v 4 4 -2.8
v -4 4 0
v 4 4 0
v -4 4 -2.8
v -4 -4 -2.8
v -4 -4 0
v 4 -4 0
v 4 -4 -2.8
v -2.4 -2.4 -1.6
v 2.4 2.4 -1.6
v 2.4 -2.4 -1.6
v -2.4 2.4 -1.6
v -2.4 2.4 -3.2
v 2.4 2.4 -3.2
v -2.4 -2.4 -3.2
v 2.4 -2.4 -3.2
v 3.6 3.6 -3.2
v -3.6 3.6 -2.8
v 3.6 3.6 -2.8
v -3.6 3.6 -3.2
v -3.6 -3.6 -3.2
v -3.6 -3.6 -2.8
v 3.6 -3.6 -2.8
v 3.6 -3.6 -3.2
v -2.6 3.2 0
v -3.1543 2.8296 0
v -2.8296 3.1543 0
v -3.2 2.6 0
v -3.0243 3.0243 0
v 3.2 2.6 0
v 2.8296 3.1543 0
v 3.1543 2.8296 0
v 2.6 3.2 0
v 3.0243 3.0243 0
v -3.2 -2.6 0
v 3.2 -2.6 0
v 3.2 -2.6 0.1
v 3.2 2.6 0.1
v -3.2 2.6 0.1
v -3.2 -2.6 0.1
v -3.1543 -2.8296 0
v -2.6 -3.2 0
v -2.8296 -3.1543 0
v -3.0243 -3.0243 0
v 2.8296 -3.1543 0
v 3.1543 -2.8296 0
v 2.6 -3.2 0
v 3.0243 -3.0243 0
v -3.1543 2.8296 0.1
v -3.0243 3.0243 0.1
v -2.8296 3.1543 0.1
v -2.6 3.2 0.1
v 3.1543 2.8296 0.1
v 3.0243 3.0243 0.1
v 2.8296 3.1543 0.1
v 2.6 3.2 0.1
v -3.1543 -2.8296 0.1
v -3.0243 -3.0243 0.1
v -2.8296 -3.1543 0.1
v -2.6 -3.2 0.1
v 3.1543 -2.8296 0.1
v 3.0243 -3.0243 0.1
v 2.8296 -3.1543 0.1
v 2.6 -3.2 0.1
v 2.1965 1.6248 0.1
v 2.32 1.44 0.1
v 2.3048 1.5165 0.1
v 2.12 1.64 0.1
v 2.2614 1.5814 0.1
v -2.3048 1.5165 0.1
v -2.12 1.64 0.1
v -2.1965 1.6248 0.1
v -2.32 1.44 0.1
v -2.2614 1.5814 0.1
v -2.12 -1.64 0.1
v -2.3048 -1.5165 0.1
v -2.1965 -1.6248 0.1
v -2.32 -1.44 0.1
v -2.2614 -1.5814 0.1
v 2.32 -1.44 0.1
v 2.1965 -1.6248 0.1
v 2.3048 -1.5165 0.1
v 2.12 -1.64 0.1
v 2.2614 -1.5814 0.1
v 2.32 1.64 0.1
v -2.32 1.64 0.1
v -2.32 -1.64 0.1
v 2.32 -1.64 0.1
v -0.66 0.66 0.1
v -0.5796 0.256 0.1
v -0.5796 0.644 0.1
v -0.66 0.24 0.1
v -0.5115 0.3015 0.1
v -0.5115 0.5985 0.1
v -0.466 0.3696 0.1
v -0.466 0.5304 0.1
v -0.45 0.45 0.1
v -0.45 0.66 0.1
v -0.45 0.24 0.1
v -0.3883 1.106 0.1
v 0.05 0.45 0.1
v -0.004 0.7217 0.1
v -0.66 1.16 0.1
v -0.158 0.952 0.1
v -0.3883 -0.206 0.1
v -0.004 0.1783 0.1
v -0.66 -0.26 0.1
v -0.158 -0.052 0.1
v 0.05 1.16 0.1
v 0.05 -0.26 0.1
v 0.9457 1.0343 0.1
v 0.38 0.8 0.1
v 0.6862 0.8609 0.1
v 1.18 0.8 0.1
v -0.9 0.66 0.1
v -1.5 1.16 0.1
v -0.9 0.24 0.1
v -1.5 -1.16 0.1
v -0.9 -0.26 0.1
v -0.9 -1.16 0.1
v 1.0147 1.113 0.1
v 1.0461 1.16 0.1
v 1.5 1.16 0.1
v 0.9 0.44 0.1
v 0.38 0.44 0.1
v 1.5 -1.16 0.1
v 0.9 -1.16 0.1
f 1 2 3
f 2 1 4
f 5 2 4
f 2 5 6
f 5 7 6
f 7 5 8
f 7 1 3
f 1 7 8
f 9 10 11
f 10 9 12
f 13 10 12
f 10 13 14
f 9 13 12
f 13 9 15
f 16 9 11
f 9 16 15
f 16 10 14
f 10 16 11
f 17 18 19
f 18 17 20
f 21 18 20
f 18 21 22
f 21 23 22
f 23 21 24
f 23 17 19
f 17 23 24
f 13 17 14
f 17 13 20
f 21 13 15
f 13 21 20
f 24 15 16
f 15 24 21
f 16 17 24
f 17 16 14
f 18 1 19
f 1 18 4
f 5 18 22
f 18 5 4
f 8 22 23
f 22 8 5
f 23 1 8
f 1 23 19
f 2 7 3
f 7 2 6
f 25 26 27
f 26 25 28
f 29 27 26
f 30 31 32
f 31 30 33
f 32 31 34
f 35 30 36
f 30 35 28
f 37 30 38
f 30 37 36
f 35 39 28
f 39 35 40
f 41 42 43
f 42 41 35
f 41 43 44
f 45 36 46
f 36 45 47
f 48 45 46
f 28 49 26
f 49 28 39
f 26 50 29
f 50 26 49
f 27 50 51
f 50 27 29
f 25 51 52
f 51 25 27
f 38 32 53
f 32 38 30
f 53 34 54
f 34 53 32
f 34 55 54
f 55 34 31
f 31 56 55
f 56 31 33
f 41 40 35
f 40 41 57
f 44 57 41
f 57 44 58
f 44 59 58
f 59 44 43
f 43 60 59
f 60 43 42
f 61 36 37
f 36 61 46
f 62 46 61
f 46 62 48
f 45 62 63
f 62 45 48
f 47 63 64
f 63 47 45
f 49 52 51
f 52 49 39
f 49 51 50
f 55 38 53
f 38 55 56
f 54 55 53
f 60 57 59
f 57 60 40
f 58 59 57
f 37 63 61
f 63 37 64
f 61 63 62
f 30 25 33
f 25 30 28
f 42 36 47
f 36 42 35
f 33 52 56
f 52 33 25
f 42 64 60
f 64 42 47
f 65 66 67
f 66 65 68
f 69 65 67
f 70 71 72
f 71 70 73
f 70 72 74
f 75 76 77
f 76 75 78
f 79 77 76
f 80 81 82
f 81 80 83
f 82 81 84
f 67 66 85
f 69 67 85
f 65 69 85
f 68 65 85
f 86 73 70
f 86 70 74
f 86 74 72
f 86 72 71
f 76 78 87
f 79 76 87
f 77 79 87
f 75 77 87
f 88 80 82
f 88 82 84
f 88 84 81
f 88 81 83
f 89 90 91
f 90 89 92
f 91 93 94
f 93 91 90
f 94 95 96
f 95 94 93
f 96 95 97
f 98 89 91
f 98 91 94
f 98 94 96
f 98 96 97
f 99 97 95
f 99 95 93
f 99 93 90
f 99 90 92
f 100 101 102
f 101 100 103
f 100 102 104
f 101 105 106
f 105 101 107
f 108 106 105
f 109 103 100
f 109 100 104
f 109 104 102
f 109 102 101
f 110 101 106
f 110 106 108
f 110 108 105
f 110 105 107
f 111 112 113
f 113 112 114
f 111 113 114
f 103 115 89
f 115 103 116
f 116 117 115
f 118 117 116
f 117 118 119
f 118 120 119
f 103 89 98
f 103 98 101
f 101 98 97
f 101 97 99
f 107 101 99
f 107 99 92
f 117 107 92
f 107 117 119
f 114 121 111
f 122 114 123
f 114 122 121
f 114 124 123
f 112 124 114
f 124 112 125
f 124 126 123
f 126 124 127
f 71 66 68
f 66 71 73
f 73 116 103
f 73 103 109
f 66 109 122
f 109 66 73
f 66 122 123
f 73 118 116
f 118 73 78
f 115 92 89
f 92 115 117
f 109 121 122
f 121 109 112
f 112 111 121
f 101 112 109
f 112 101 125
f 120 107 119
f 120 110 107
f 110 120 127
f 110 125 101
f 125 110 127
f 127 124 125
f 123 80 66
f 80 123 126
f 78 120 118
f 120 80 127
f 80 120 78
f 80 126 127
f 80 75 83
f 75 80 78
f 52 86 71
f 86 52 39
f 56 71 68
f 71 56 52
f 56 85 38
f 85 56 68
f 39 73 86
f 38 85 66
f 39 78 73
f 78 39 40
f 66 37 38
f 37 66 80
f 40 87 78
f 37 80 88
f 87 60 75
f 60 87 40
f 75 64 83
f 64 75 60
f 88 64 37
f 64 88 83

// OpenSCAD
// file: ../p/box5.scad
use <../lib.scad>
function ldraw_lib__box5() = [
// 0 Box with 5 Faces and All Edges
// 0 Name: box5.dat
// 0 Author: James Jessiman
// 0 !LDRAW_ORG Primitive UPDATE 2012-01
// 0 !LICENSE Licensed under CC BY 4.0 : see CAreadme.txt
// 
// 0 BFC CERTIFY CCW
  [0,"BFC","CERTIFY"],
  [0,"BFC","CCW"],
// 
// 0 !HISTORY 2002-04-03 [sbliss] Modified for BFC compliance
// 0 !HISTORY 2002-04-25 [PTadmin] Official Update 2002-02
// 0 !HISTORY 2007-06-24 [PTadmin] Header formatted for Contributor Agreement
// 0 !HISTORY 2008-07-01 [PTadmin] Official Update 2008-01
// 0 !HISTORY 2012-02-16 [Philo] Changed to CCW
// 0 !HISTORY 2012-03-30 [PTadmin] Official Update 2012-01
// 
// 
// 2 24 1 1 1 -1 1 1
  [2,24,1,1,1,-1,1,1],
// 2 24 -1 1 1 -1 1 -1
  [2,24,-1,1,1,-1,1,-1],
// 2 24 -1 1 -1 1 1 -1
  [2,24,-1,1,-1,1,1,-1],
// 2 24 1 1 -1 1 1 1
  [2,24,1,1,-1,1,1,1],
// 2 24 1 0 1 -1 0 1
  [2,24,1,0,1,-1,0,1],
// 2 24 -1 0 1 -1 0 -1
  [2,24,-1,0,1,-1,0,-1],
// 2 24 -1 0 -1 1 0 -1
  [2,24,-1,0,-1,1,0,-1],
// 2 24 1 0 -1 1 0 1
  [2,24,1,0,-1,1,0,1],
// 2 24 1 0 1 1 1 1
  [2,24,1,0,1,1,1,1],
// 2 24 -1 0 1 -1 1 1
  [2,24,-1,0,1,-1,1,1],
// 2 24 1 0 -1 1 1 -1
  [2,24,1,0,-1,1,1,-1],
// 2 24 -1 0 -1 -1 1 -1
  [2,24,-1,0,-1,-1,1,-1],
// 4 16 -1 1 1 1 1 1 1 1 -1 -1 1 -1
  [4,16,-1,1,1,1,1,1,1,1,-1,-1,1,-1],
// 4 16 -1 1 1 -1 0 1 1 0 1 1 1 1
  [4,16,-1,1,1,-1,0,1,1,0,1,1,1,1],
// 4 16 -1 1 -1 -1 0 -1 -1 0 1 -1 1 1
  [4,16,-1,1,-1,-1,0,-1,-1,0,1,-1,1,1],
// 4 16 1 1 -1 1 0 -1 -1 0 -1 -1 1 -1
  [4,16,1,1,-1,1,0,-1,-1,0,-1,-1,1,-1],
// 4 16 1 1 1 1 0 1 1 0 -1 1 1 -1
  [4,16,1,1,1,1,0,1,1,0,-1,1,1,-1],
];
module ldraw_lib__box5(step=0, col=false, unit=2/5, alt=false, line=0.2, solid=!$preview)
    makepoly(ldraw_lib__box5(), step=step, col=col, unit=unit, alt=alt, line=line, solid=solid);
ldraw_lib__box5(line=0.2);
// file: ../p/box4.scad
use <../lib.scad>
function ldraw_lib__box4() = [
// 0 Box with 4 Faces (2 Parallel Pairs) and All Edges
// 0 Name: box4.dat
// 0 Author: James Jessiman
// 0 !LDRAW_ORG Primitive UPDATE 2012-01
// 0 !LICENSE Licensed under CC BY 4.0 : see CAreadme.txt
// 
// 0 BFC CERTIFY CCW
  [0,"BFC","CERTIFY"],
  [0,"BFC","CCW"],
// 
// 0 !HISTORY 2002-04-03 [sbliss] Modified for BFC compliance
// 0 !HISTORY 2002-04-25 [PTadmin] Official Update 2002-02
// 0 !HISTORY 2007-06-24 [PTadmin] Header formatted for Contributor Agreement
// 0 !HISTORY 2008-07-01 [PTadmin] Official Update 2008-01
// 0 !HISTORY 2012-02-16 [Philo] Changed to CCW
// 0 !HISTORY 2012-03-30 [PTadmin] Official Update 2012-01
// 
// 
// 2 24 1 1 1 -1 1 1
  [2,24,1,1,1,-1,1,1],
// 2 24 -1 1 1 -1 1 -1
  [2,24,-1,1,1,-1,1,-1],
// 2 24 -1 1 -1 1 1 -1
  [2,24,-1,1,-1,1,1,-1],
// 2 24 1 1 -1 1 1 1
  [2,24,1,1,-1,1,1,1],
// 2 24 1 0 1 -1 0 1
  [2,24,1,0,1,-1,0,1],
// 2 24 -1 0 1 -1 0 -1
  [2,24,-1,0,1,-1,0,-1],
// 2 24 -1 0 -1 1 0 -1
  [2,24,-1,0,-1,1,0,-1],
// 2 24 1 0 -1 1 0 1
  [2,24,1,0,-1,1,0,1],
// 2 24 1 0 1 1 1 1
  [2,24,1,0,1,1,1,1],
// 2 24 -1 0 1 -1 1 1
  [2,24,-1,0,1,-1,1,1],
// 2 24 1 0 -1 1 1 -1
  [2,24,1,0,-1,1,1,-1],
// 2 24 -1 0 -1 -1 1 -1
  [2,24,-1,0,-1,-1,1,-1],
// 4 16 -1 1 1 -1 0 1 1 0 1 1 1 1
  [4,16,-1,1,1,-1,0,1,1,0,1,1,1,1],
// 4 16 -1 1 -1 -1 0 -1 -1 0 1 -1 1 1
  [4,16,-1,1,-1,-1,0,-1,-1,0,1,-1,1,1],
// 4 16 1 1 -1 1 0 -1 -1 0 -1 -1 1 -1
  [4,16,1,1,-1,1,0,-1,-1,0,-1,-1,1,-1],
// 4 16 1 1 1 1 0 1 1 0 -1 1 1 -1
  [4,16,1,1,1,1,0,1,1,0,-1,1,1,-1],
];
module ldraw_lib__box4(step=0, col=false, unit=2/5, alt=false, line=0.2, solid=!$preview)
    makepoly(ldraw_lib__box4(), step=step, col=col, unit=unit, alt=alt, line=line, solid=solid);
ldraw_lib__box4(line=0.2);
// file: ../p/box3u12.scad
use <../lib.scad>
function ldraw_lib__box3u12() = [
// 0 Box with 3 Parallel Faces without Any Edges
// 0 Name: box3u12.dat
// 0 Author: J.C. Tchang [tchang]
// 0 !LDRAW_ORG Primitive UPDATE 2014-02
// 0 !LICENSE Licensed under CC BY 4.0 : see CAreadme.txt
// 
// 0 BFC CERTIFY CCW
  [0,"BFC","CERTIFY"],
  [0,"BFC","CCW"],
// 
// 0 !HISTORY 2014-12-23 [PTadmin] Official Update 2014-02
// 
// 
// 4 16 -1 1 1 1 1 1 1 1 -1 -1 1 -1
  [4,16,-1,1,1,1,1,1,1,1,-1,-1,1,-1],
// 4 16 -1 1 1 -1 0 1 1 0 1 1 1 1
  [4,16,-1,1,1,-1,0,1,1,0,1,1,1,1],
// 4 16 1 1 -1 1 0 -1 -1 0 -1 -1 1 -1
  [4,16,1,1,-1,1,0,-1,-1,0,-1,-1,1,-1],
];
module ldraw_lib__box3u12(step=0, col=false, unit=2/5, alt=false, line=0.2, solid=!$preview)
    makepoly(ldraw_lib__box3u12(), step=step, col=col, unit=unit, alt=alt, line=line, solid=solid);
ldraw_lib__box3u12(line=0.2);
// file: ../p/2-4ndis.scad
use <../lib.scad>
function ldraw_lib__2_4ndis() = [
// 0 Disc Negative 0.5
// 0 Name: 2-4ndis.dat
// 0 Author: James Jessiman
// 0 !LDRAW_ORG Primitive UPDATE 2012-01
// 0 !LICENSE Licensed under CC BY 4.0 : see CAreadme.txt
// 
// 0 BFC CERTIFY CCW
  [0,"BFC","CERTIFY"],
  [0,"BFC","CCW"],
// 
// 0 !HISTORY 2002-03-23 [sbliss] Added BFC statement; compacted code
// 0 !HISTORY 2002-04-25 [PTadmin] Official Update 2002-02
// 0 !HISTORY 2007-06-24 [PTadmin] Header formatted for Contributor Agreement
// 0 !HISTORY 2008-07-01 [PTadmin] Official Update 2008-01
// 0 !HISTORY 2012-02-16 [Philo] Changed to CCW
// 0 !HISTORY 2012-03-30 [PTadmin] Official Update 2012-01
// 
// 
// 3 16 0.9239 0 0.3827 1 0 0 1 0 1
  [3,16,0.9239,0,0.3827,1,0,0,1,0,1],
// 3 16 0.7071 0 0.7071 0.9239 0 0.3827 1 0 1
  [3,16,0.7071,0,0.7071,0.9239,0,0.3827,1,0,1],
// 3 16 0.3827 0 0.9239 0.7071 0 0.7071 1 0 1
  [3,16,0.3827,0,0.9239,0.7071,0,0.7071,1,0,1],
// 3 16 0 0 1 0.3827 0 0.9239 1 0 1
  [3,16,0,0,1,0.3827,0,0.9239,1,0,1],
// 3 16 -0.3827 0 0.9239 0 0 1 -1 0 1
  [3,16,-0.3827,0,0.9239,0,0,1,-1,0,1],
// 3 16 -0.7071 0 0.7071 -0.3827 0 0.9239 -1 0 1
  [3,16,-0.7071,0,0.7071,-0.3827,0,0.9239,-1,0,1],
// 3 16 -0.9239 0 0.3827 -0.7071 0 0.7071 -1 0 1
  [3,16,-0.9239,0,0.3827,-0.7071,0,0.7071,-1,0,1],
// 3 16 -1 0 0 -0.9239 0 0.3827 -1 0 1
  [3,16,-1,0,0,-0.9239,0,0.3827,-1,0,1],
];
module ldraw_lib__2_4ndis(step=0, col=false, unit=2/5, alt=false, line=0.2, solid=!$preview)
    makepoly(ldraw_lib__2_4ndis(), step=step, col=col, unit=unit, alt=alt, line=line, solid=solid);
ldraw_lib__2_4ndis(line=0.2);
// file: ../p/2-4chrd.scad
use <../lib.scad>
function ldraw_lib__2_4chrd() = [
// 0 Chord 0.5
// 0 Name: 2-4chrd.dat
// 0 Author: Philippe Hurbain [Philo]
// 0 !LDRAW_ORG Primitive UPDATE 2014-01
// 0 !LICENSE Licensed under CC BY 4.0 : see CAreadme.txt
// 
// 0 BFC CERTIFY CCW
  [0,"BFC","CERTIFY"],
  [0,"BFC","CCW"],
// 
// 0 !HISTORY 2014-06-21 [PTadmin] Official Update 2014-01
// 
// 
// 4 16 0.9239 0 0.3827 -0.9239 0 0.3827 -1 0 0 1 0 0
  [4,16,0.9239,0,0.3827,-0.9239,0,0.3827,-1,0,0,1,0,0],
// 4 16 0.7071 0 0.7071 -0.7071 0 0.7071 -0.9239 0 0.3827 0.9239 0 0.3827
  [4,16,0.7071,0,0.7071,-0.7071,0,0.7071,-0.9239,0,0.3827,0.9239,0,0.3827],
// 4 16 0.3827 0 0.9239 -0.3827 0 0.9239 -0.7071 0 0.7071 0.7071 0 0.7071
  [4,16,0.3827,0,0.9239,-0.3827,0,0.9239,-0.7071,0,0.7071,0.7071,0,0.7071],
// 3 16 0 0 1 -0.3827 0 0.9239 0.3827 0 0.9239
  [3,16,0,0,1,-0.3827,0,0.9239,0.3827,0,0.9239],
];
module ldraw_lib__2_4chrd(step=0, col=false, unit=2/5, alt=false, line=0.2, solid=!$preview)
    makepoly(ldraw_lib__2_4chrd(), step=step, col=col, unit=unit, alt=alt, line=line, solid=solid);
ldraw_lib__2_4chrd(line=0.2);
// file: ../p/1-8ndis.scad
use <../lib.scad>
function ldraw_lib__1_8ndis() = [
// 0 Disc Negative 0.125
// 0 Name: 1-8ndis.dat
// 0 Author: James Jessiman
// 0 !LDRAW_ORG Primitive UPDATE 2012-01
// 0 !LICENSE Licensed under CC BY 4.0 : see CAreadme.txt
// 
// 0 BFC CERTIFY CCW
  [0,"BFC","CERTIFY"],
  [0,"BFC","CCW"],
// 
// 0 !HISTORY 2002-03-23 [sbliss] Added BFC statement
// 0 !HISTORY 2002-04-25 [PTadmin] Official Update 2002-02
// 0 !HISTORY 2007-06-22 [PTadmin] Header formatted for Contributor Agreement
// 0 !HISTORY 2008-07-01 [PTadmin] Official Update 2008-01
// 0 !HISTORY 2012-02-16 [Philo] Changed to CCW
// 0 !HISTORY 2012-03-30 [PTadmin] Official Update 2012-01
// 
// 
// 3 16 0.9239 0 0.3827 1 0 0 1 0 1
  [3,16,0.9239,0,0.3827,1,0,0,1,0,1],
// 3 16 0.7071 0 0.7071 0.9239 0 0.3827 1 0 1
  [3,16,0.7071,0,0.7071,0.9239,0,0.3827,1,0,1],
];
module ldraw_lib__1_8ndis(step=0, col=false, unit=2/5, alt=false, line=0.2, solid=!$preview)
    makepoly(ldraw_lib__1_8ndis(), step=step, col=col, unit=unit, alt=alt, line=line, solid=solid);
ldraw_lib__1_8ndis(line=0.2);
// file: ../p/1-8chrd.scad
use <../lib.scad>
function ldraw_lib__1_8chrd() = [
// 0 Chord 0.125
// 0 Name: 1-8chrd.dat
// 0 Author: Orion Pobursky [OrionP]
// 0 !LDRAW_ORG Primitive UPDATE 2023-05
// 0 !LICENSE Licensed under CC BY 4.0 : see CAreadme.txt
// 
// 0 BFC CERTIFY CCW
  [0,"BFC","CERTIFY"],
  [0,"BFC","CCW"],
// 
// 0 !HISTORY 2004-04-22 [PTadmin] Official Update 2004-02
// 0 !HISTORY 2007-06-22 [PTadmin] Header formatted for Contributor Agreement
// 0 !HISTORY 2008-07-01 [PTadmin] Official Update 2008-01
// 0 !HISTORY 2023-10-27 [OrionP] Rebuilt with PrimGen2, original author westrate
// 0 !HISTORY 2023-10-31 [OrionP] Official Update 2023-05
// 
// 3 16 1 0 0 0.9239 0 0.3827 0.7071 0 0.7071
  [3,16,1,0,0,0.9239,0,0.3827,0.7071,0,0.7071],
];
module ldraw_lib__1_8chrd(step=0, col=false, unit=2/5, alt=false, line=0.2, solid=!$preview)
    makepoly(ldraw_lib__1_8chrd(), step=step, col=col, unit=unit, alt=alt, line=line, solid=solid);
ldraw_lib__1_8chrd(line=0.2);
// file: ../p/1-4ndis.scad
use <../lib.scad>
function ldraw_lib__1_4ndis() = [
// 0 Disc Negative 0.25
// 0 Name: 1-4ndis.dat
// 0 Author: James Jessiman
// 0 !LDRAW_ORG Primitive UPDATE 2012-01
// 0 !LICENSE Licensed under CC BY 4.0 : see CAreadme.txt
// 
// 0 BFC CERTIFY CCW
  [0,"BFC","CERTIFY"],
  [0,"BFC","CCW"],
// 
// 0 !HISTORY 2002-03-23 [sbliss] Added BFC Statement
// 0 !HISTORY 2002-04-25 [PTadmin] Official Update 2002-02
// 0 !HISTORY 2007-06-22 [PTadmin] Header formatted for Contributor Agreement
// 0 !HISTORY 2008-07-01 [PTadmin] Official Update 2008-01
// 0 !HISTORY 2012-02-16 [Philo] Changed to CCW
// 0 !HISTORY 2012-03-30 [PTadmin] Official Update 2012-01
// 
// 
// 3 16 0.9239 0 0.3827 1 0 0 1 0 1
  [3,16,0.9239,0,0.3827,1,0,0,1,0,1],
// 3 16 0.7071 0 0.7071 0.9239 0 0.3827 1 0 1
  [3,16,0.7071,0,0.7071,0.9239,0,0.3827,1,0,1],
// 3 16 0.3827 0 0.9239 0.7071 0 0.7071 1 0 1
  [3,16,0.3827,0,0.9239,0.7071,0,0.7071,1,0,1],
// 3 16 0 0 1 0.3827 0 0.9239 1 0 1
  [3,16,0,0,1,0.3827,0,0.9239,1,0,1],
];
module ldraw_lib__1_4ndis(step=0, col=false, unit=2/5, alt=false, line=0.2, solid=!$preview)
    makepoly(ldraw_lib__1_4ndis(), step=step, col=col, unit=unit, alt=alt, line=line, solid=solid);
ldraw_lib__1_4ndis(line=0.2);
// file: ../p/1-4cyli.scad
use <../lib.scad>
function ldraw_lib__1_4cyli() = [
// 0 Cylinder 0.25
// 0 Name: 1-4cyli.dat
// 0 Author: James Jessiman
// 0 !LDRAW_ORG Primitive UPDATE 2012-01
// 0 !LICENSE Licensed under CC BY 4.0 : see CAreadme.txt
// 
// 0 BFC CERTIFY CCW
  [0,"BFC","CERTIFY"],
  [0,"BFC","CCW"],
// 
// 0 !HISTORY 2002-03-23 [sbliss] Added BFC statement.
// 0 !HISTORY 2002-04-25 [PTadmin] Official Update 2002-02
// 0 !HISTORY 2007-06-22 [PTadmin] Header formatted for Contributor Agreement
// 0 !HISTORY 2008-07-01 [PTadmin] Official Update 2008-01
// 0 !HISTORY 2012-02-16 [Philo] Changed to CCW
// 0 !HISTORY 2012-03-30 [PTadmin] Official Update 2012-01
// 
// 
// 4 16 1 1 0 0.9239 1 0.3827 0.9239 0 0.3827 1 0 0
  [4,16,1,1,0,0.9239,1,0.3827,0.9239,0,0.3827,1,0,0],
// 5 24 1 0 0 1 1 0 0.9239 0 0.3827 1 0 -1
  [5,24,1,0,0,1,1,0,0.9239,0,0.3827,1,0,-1],
// 4 16 0.9239 1 0.3827 0.7071 1 0.7071 0.7071 0 0.7071 0.9239 0 0.3827
  [4,16,0.9239,1,0.3827,0.7071,1,0.7071,0.7071,0,0.7071,0.9239,0,0.3827],
// 5 24 0.9239 0 0.3827 0.9239 1 0.3827 0.7071 0 0.7071 1 0 0
  [5,24,0.9239,0,0.3827,0.9239,1,0.3827,0.7071,0,0.7071,1,0,0],
// 4 16 0.7071 1 0.7071 0.3827 1 0.9239 0.3827 0 0.9239 0.7071 0 0.7071
  [4,16,0.7071,1,0.7071,0.3827,1,0.9239,0.3827,0,0.9239,0.7071,0,0.7071],
// 5 24 0.7071 0 0.7071 0.7071 1 0.7071 0.3827 0 0.9239 0.9239 0 0.3827
  [5,24,0.7071,0,0.7071,0.7071,1,0.7071,0.3827,0,0.9239,0.9239,0,0.3827],
// 4 16 0.3827 1 0.9239 0 1 1 0 0 1 0.3827 0 0.9239
  [4,16,0.3827,1,0.9239,0,1,1,0,0,1,0.3827,0,0.9239],
// 5 24 0.3827 0 0.9239 0.3827 1 0.9239 0 0 1 0.7071 0 0.7071
  [5,24,0.3827,0,0.9239,0.3827,1,0.9239,0,0,1,0.7071,0,0.7071],
// 5 24 0 0 1 0 1 1 0.3827 0 0.9239 -1 0 1
  [5,24,0,0,1,0,1,1,0.3827,0,0.9239,-1,0,1],
];
module ldraw_lib__1_4cyli(step=0, col=false, unit=2/5, alt=false, line=0.2, solid=!$preview)
    makepoly(ldraw_lib__1_4cyli(), step=step, col=col, unit=unit, alt=alt, line=line, solid=solid);
ldraw_lib__1_4cyli(line=0.2);
// file: ../p/1-4chrd.scad
use <../lib.scad>
function ldraw_lib__1_4chrd() = [
// 0 Chord 0.25
// 0 Name: 1-4chrd.dat
// 0 Author: Max Martin Richter [MMR1988]
// 0 !LDRAW_ORG Primitive UPDATE 2023-05
// 0 !LICENSE Licensed under CC BY 4.0 : see CAreadme.txt
// 
// 0 BFC CERTIFY CCW
  [0,"BFC","CERTIFY"],
  [0,"BFC","CCW"],
// 
// 0 !HISTORY 2004-04-22 [PTadmin] Official Update 2004-02
// 0 !HISTORY 2007-10-09 [PTadmin] Header formatted for Contributor Agreement
// 0 !HISTORY 2008-07-01 [PTadmin] Official Update 2008-01
// 0 !HISTORY 2012-08-02 [MMR1988] Re-creation with PrimGen2 and Rectifier
// 0 !HISTORY 2012-08-09 [PTadmin] Official Update 2012-02
// 0 !HISTORY 2023-10-27 [OrionP] Change author to MMR1988 from hafhead
// 0 !HISTORY 2023-10-31 [OrionP] Official Update 2023-05
// 
// 4 16 0.9239 0 0.3827 0.3827 0 0.9239 0 0 1 1 0 0
  [4,16,0.9239,0,0.3827,0.3827,0,0.9239,0,0,1,1,0,0],
// 3 16 0.7071 0 0.7071 0.3827 0 0.9239 0.9239 0 0.3827
  [3,16,0.7071,0,0.7071,0.3827,0,0.9239,0.9239,0,0.3827],
];
module ldraw_lib__1_4chrd(step=0, col=false, unit=2/5, alt=false, line=0.2, solid=!$preview)
    makepoly(ldraw_lib__1_4chrd(), step=step, col=col, unit=unit, alt=alt, line=line, solid=solid);
ldraw_lib__1_4chrd(line=0.2);
// file: s/3070bs01.scad
use <../../lib.scad>
use <../../p/box4.scad>
use <../../p/box5.scad>
function ldraw_lib__s__3070bs01() = [
// 0 ~Tile  1 x  1 with Groove without Top Face
// 0 Name: s\3070bs01.dat
// 0 Author: Chris Dee [cwdee]
// 0 !LDRAW_ORG Subpart UPDATE 2009-02
// 0 !LICENSE Licensed under CC BY 4.0 : see CAreadme.txt
// 
// 0 BFC CERTIFY CCW
  [0,"BFC","CERTIFY"],
  [0,"BFC","CCW"],
// 
// 0 !HISTORY 2009-09-03 [PTadmin] Official Update 2009-02
// 
// 
// 1 16 0 0 0 10 0 0 0 7 0 0 0 10 box4.dat
  [1,16,0,0,0,10,0,0,0,7,0,0,0,10, ldraw_lib__box4()],
// 0 BFC INVERTNEXT
  [0,"BFC","INVERTNEXT"],
// 1 16 0 8 0 6 0 0 0 -4 0 0 0 6 box5.dat
  [1,16,0,8,0,6,0,0,0,-4,0,0,0,6, ldraw_lib__box5()],
// 1 16 0 7 0 9 0 0 0 1 0 0 0 9 box4.dat
  [1,16,0,7,0,9,0,0,0,1,0,0,0,9, ldraw_lib__box4()],
// 
// 4 16 9 8 9 6 8 6 -6 8 6 -9 8 9
  [4,16,9,8,9,6,8,6,-6,8,6,-9,8,9],
// 4 16 -9 8 9 -6 8 6 -6 8 -6 -9 8 -9
  [4,16,-9,8,9,-6,8,6,-6,8,-6,-9,8,-9],
// 4 16 -9 8 -9 -6 8 -6 6 8 -6 9 8 -9
  [4,16,-9,8,-9,-6,8,-6,6,8,-6,9,8,-9],
// 4 16 9 8 -9 6 8 -6 6 8 6 9 8 9
  [4,16,9,8,-9,6,8,-6,6,8,6,9,8,9],
// 
// 4 16 10 7 10 9 7 9 -9 7 9 -10 7 10
  [4,16,10,7,10,9,7,9,-9,7,9,-10,7,10],
// 4 16 -10 7 10 -9 7 9 -9 7 -9 -10 7 -10
  [4,16,-10,7,10,-9,7,9,-9,7,-9,-10,7,-10],
// 4 16 -10 7 -10 -9 7 -9 9 7 -9 10 7 -10
  [4,16,-10,7,-10,-9,7,-9,9,7,-9,10,7,-10],
// 4 16 10 7 -10 9 7 -9 9 7 9 10 7 10
  [4,16,10,7,-10,9,7,-9,9,7,9,10,7,10],
// 0
];
module ldraw_lib__s__3070bs01(step=0, col=false, unit=2/5, alt=false, line=0.2, solid=!$preview)
    makepoly(ldraw_lib__s__3070bs01(), step=step, col=col, unit=unit, alt=alt, line=line, solid=solid);
ldraw_lib__s__3070bs01(line=0.2);
// file: 3070b.scad
use <../lib.scad>
use <s/3070bs01.scad>
function ldraw_lib__3070b() = [
// 0 Tile  1 x  1 with Groove
// 0 Name: 3070b.dat
// 0 Author: Chris Dee [cwdee]
// 0 !LDRAW_ORG Part UPDATE 2025-09
// 0 !LICENSE Licensed under CC BY 4.0 : see CAreadme.txt
// 
// 0 BFC CERTIFY CCW
  [0,"BFC","CERTIFY"],
  [0,"BFC","CCW"],
// 
// 0 !KEYWORDS BrickLink 3070
// 
// 0 !HISTORY 2009-09-03 [PTadmin] Official Update 2009-02
// 0 !HISTORY 2025-09-27 [OrionP] Changed winding to CCW
// 0 !HISTORY 2025-09-29 [OrionP] Official Update 2025-09
// 
// 1 16 0 0 0 1 0 0 0 1 0 0 0 1 s\3070bs01.dat
  [1,16,0,0,0,1,0,0,0,1,0,0,0,1, ldraw_lib__s__3070bs01()],
// 4 16 -10 0 10 -10 0 -10 10 0 -10 10 0 10
  [4,16,-10,0,10,-10,0,-10,10,0,-10,10,0,10],
// 0
];
module ldraw_lib__3070b(step=0, col=false, unit=2/5, alt=false, line=0.2, solid=!$preview)
    makepoly(ldraw_lib__3070b(), step=step, col=col, unit=unit, alt=alt, line=line, solid=solid);
ldraw_lib__3070b(line=0.2);
// main file
use <../lib.scad>
use <3070b.scad>
use <6142275s.scad>
function ldraw_lib__3070bd06() = [
// 0 Tile  1 x  1 with Red "P1" in White Square on Red Background Sticker
// 0 Name: 3070bd06.dat
// 0 Author: Vincent Messenet [Cheenzo]
// 0 !LDRAW_ORG Shortcut UPDATE 2026-05
// 0 !LICENSE Licensed under CC BY 4.0 : see CAreadme.txt
// 
// 0 BFC CERTIFY CCW
  [0,"BFC","CERTIFY"],
  [0,"BFC","CCW"],
// 
// 0 !CATEGORY Sticker Shortcut
// 
// 0 !KEYWORDS Bricklink 3070pb348L, Set 75872
// 
// 0 !HISTORY 2026-05-31 [OrionP] Official Update 2026-05
// 
// 1 16 0 0 0 1 0 0 0 1 0 0 0 1 3070b.dat
  [1,16,0,0,0,1,0,0,0,1,0,0,0,1, ldraw_lib__3070b()],
// 1 16 0 0 0 1 0 0 0 1 0 0 0 1 6142275s.dat
  [1,16,0,0,0,1,0,0,0,1,0,0,0,1, ldraw_lib__6142275s()],
];
module ldraw_lib__3070bd06(step=0, col=false, unit=2/5, alt=false, line=0.2, solid=!$preview)
    makepoly(ldraw_lib__3070bd06(), step=step, col=col, unit=unit, alt=alt, line=line, solid=solid);
ldraw_lib__3070bd06(line=0.2);
